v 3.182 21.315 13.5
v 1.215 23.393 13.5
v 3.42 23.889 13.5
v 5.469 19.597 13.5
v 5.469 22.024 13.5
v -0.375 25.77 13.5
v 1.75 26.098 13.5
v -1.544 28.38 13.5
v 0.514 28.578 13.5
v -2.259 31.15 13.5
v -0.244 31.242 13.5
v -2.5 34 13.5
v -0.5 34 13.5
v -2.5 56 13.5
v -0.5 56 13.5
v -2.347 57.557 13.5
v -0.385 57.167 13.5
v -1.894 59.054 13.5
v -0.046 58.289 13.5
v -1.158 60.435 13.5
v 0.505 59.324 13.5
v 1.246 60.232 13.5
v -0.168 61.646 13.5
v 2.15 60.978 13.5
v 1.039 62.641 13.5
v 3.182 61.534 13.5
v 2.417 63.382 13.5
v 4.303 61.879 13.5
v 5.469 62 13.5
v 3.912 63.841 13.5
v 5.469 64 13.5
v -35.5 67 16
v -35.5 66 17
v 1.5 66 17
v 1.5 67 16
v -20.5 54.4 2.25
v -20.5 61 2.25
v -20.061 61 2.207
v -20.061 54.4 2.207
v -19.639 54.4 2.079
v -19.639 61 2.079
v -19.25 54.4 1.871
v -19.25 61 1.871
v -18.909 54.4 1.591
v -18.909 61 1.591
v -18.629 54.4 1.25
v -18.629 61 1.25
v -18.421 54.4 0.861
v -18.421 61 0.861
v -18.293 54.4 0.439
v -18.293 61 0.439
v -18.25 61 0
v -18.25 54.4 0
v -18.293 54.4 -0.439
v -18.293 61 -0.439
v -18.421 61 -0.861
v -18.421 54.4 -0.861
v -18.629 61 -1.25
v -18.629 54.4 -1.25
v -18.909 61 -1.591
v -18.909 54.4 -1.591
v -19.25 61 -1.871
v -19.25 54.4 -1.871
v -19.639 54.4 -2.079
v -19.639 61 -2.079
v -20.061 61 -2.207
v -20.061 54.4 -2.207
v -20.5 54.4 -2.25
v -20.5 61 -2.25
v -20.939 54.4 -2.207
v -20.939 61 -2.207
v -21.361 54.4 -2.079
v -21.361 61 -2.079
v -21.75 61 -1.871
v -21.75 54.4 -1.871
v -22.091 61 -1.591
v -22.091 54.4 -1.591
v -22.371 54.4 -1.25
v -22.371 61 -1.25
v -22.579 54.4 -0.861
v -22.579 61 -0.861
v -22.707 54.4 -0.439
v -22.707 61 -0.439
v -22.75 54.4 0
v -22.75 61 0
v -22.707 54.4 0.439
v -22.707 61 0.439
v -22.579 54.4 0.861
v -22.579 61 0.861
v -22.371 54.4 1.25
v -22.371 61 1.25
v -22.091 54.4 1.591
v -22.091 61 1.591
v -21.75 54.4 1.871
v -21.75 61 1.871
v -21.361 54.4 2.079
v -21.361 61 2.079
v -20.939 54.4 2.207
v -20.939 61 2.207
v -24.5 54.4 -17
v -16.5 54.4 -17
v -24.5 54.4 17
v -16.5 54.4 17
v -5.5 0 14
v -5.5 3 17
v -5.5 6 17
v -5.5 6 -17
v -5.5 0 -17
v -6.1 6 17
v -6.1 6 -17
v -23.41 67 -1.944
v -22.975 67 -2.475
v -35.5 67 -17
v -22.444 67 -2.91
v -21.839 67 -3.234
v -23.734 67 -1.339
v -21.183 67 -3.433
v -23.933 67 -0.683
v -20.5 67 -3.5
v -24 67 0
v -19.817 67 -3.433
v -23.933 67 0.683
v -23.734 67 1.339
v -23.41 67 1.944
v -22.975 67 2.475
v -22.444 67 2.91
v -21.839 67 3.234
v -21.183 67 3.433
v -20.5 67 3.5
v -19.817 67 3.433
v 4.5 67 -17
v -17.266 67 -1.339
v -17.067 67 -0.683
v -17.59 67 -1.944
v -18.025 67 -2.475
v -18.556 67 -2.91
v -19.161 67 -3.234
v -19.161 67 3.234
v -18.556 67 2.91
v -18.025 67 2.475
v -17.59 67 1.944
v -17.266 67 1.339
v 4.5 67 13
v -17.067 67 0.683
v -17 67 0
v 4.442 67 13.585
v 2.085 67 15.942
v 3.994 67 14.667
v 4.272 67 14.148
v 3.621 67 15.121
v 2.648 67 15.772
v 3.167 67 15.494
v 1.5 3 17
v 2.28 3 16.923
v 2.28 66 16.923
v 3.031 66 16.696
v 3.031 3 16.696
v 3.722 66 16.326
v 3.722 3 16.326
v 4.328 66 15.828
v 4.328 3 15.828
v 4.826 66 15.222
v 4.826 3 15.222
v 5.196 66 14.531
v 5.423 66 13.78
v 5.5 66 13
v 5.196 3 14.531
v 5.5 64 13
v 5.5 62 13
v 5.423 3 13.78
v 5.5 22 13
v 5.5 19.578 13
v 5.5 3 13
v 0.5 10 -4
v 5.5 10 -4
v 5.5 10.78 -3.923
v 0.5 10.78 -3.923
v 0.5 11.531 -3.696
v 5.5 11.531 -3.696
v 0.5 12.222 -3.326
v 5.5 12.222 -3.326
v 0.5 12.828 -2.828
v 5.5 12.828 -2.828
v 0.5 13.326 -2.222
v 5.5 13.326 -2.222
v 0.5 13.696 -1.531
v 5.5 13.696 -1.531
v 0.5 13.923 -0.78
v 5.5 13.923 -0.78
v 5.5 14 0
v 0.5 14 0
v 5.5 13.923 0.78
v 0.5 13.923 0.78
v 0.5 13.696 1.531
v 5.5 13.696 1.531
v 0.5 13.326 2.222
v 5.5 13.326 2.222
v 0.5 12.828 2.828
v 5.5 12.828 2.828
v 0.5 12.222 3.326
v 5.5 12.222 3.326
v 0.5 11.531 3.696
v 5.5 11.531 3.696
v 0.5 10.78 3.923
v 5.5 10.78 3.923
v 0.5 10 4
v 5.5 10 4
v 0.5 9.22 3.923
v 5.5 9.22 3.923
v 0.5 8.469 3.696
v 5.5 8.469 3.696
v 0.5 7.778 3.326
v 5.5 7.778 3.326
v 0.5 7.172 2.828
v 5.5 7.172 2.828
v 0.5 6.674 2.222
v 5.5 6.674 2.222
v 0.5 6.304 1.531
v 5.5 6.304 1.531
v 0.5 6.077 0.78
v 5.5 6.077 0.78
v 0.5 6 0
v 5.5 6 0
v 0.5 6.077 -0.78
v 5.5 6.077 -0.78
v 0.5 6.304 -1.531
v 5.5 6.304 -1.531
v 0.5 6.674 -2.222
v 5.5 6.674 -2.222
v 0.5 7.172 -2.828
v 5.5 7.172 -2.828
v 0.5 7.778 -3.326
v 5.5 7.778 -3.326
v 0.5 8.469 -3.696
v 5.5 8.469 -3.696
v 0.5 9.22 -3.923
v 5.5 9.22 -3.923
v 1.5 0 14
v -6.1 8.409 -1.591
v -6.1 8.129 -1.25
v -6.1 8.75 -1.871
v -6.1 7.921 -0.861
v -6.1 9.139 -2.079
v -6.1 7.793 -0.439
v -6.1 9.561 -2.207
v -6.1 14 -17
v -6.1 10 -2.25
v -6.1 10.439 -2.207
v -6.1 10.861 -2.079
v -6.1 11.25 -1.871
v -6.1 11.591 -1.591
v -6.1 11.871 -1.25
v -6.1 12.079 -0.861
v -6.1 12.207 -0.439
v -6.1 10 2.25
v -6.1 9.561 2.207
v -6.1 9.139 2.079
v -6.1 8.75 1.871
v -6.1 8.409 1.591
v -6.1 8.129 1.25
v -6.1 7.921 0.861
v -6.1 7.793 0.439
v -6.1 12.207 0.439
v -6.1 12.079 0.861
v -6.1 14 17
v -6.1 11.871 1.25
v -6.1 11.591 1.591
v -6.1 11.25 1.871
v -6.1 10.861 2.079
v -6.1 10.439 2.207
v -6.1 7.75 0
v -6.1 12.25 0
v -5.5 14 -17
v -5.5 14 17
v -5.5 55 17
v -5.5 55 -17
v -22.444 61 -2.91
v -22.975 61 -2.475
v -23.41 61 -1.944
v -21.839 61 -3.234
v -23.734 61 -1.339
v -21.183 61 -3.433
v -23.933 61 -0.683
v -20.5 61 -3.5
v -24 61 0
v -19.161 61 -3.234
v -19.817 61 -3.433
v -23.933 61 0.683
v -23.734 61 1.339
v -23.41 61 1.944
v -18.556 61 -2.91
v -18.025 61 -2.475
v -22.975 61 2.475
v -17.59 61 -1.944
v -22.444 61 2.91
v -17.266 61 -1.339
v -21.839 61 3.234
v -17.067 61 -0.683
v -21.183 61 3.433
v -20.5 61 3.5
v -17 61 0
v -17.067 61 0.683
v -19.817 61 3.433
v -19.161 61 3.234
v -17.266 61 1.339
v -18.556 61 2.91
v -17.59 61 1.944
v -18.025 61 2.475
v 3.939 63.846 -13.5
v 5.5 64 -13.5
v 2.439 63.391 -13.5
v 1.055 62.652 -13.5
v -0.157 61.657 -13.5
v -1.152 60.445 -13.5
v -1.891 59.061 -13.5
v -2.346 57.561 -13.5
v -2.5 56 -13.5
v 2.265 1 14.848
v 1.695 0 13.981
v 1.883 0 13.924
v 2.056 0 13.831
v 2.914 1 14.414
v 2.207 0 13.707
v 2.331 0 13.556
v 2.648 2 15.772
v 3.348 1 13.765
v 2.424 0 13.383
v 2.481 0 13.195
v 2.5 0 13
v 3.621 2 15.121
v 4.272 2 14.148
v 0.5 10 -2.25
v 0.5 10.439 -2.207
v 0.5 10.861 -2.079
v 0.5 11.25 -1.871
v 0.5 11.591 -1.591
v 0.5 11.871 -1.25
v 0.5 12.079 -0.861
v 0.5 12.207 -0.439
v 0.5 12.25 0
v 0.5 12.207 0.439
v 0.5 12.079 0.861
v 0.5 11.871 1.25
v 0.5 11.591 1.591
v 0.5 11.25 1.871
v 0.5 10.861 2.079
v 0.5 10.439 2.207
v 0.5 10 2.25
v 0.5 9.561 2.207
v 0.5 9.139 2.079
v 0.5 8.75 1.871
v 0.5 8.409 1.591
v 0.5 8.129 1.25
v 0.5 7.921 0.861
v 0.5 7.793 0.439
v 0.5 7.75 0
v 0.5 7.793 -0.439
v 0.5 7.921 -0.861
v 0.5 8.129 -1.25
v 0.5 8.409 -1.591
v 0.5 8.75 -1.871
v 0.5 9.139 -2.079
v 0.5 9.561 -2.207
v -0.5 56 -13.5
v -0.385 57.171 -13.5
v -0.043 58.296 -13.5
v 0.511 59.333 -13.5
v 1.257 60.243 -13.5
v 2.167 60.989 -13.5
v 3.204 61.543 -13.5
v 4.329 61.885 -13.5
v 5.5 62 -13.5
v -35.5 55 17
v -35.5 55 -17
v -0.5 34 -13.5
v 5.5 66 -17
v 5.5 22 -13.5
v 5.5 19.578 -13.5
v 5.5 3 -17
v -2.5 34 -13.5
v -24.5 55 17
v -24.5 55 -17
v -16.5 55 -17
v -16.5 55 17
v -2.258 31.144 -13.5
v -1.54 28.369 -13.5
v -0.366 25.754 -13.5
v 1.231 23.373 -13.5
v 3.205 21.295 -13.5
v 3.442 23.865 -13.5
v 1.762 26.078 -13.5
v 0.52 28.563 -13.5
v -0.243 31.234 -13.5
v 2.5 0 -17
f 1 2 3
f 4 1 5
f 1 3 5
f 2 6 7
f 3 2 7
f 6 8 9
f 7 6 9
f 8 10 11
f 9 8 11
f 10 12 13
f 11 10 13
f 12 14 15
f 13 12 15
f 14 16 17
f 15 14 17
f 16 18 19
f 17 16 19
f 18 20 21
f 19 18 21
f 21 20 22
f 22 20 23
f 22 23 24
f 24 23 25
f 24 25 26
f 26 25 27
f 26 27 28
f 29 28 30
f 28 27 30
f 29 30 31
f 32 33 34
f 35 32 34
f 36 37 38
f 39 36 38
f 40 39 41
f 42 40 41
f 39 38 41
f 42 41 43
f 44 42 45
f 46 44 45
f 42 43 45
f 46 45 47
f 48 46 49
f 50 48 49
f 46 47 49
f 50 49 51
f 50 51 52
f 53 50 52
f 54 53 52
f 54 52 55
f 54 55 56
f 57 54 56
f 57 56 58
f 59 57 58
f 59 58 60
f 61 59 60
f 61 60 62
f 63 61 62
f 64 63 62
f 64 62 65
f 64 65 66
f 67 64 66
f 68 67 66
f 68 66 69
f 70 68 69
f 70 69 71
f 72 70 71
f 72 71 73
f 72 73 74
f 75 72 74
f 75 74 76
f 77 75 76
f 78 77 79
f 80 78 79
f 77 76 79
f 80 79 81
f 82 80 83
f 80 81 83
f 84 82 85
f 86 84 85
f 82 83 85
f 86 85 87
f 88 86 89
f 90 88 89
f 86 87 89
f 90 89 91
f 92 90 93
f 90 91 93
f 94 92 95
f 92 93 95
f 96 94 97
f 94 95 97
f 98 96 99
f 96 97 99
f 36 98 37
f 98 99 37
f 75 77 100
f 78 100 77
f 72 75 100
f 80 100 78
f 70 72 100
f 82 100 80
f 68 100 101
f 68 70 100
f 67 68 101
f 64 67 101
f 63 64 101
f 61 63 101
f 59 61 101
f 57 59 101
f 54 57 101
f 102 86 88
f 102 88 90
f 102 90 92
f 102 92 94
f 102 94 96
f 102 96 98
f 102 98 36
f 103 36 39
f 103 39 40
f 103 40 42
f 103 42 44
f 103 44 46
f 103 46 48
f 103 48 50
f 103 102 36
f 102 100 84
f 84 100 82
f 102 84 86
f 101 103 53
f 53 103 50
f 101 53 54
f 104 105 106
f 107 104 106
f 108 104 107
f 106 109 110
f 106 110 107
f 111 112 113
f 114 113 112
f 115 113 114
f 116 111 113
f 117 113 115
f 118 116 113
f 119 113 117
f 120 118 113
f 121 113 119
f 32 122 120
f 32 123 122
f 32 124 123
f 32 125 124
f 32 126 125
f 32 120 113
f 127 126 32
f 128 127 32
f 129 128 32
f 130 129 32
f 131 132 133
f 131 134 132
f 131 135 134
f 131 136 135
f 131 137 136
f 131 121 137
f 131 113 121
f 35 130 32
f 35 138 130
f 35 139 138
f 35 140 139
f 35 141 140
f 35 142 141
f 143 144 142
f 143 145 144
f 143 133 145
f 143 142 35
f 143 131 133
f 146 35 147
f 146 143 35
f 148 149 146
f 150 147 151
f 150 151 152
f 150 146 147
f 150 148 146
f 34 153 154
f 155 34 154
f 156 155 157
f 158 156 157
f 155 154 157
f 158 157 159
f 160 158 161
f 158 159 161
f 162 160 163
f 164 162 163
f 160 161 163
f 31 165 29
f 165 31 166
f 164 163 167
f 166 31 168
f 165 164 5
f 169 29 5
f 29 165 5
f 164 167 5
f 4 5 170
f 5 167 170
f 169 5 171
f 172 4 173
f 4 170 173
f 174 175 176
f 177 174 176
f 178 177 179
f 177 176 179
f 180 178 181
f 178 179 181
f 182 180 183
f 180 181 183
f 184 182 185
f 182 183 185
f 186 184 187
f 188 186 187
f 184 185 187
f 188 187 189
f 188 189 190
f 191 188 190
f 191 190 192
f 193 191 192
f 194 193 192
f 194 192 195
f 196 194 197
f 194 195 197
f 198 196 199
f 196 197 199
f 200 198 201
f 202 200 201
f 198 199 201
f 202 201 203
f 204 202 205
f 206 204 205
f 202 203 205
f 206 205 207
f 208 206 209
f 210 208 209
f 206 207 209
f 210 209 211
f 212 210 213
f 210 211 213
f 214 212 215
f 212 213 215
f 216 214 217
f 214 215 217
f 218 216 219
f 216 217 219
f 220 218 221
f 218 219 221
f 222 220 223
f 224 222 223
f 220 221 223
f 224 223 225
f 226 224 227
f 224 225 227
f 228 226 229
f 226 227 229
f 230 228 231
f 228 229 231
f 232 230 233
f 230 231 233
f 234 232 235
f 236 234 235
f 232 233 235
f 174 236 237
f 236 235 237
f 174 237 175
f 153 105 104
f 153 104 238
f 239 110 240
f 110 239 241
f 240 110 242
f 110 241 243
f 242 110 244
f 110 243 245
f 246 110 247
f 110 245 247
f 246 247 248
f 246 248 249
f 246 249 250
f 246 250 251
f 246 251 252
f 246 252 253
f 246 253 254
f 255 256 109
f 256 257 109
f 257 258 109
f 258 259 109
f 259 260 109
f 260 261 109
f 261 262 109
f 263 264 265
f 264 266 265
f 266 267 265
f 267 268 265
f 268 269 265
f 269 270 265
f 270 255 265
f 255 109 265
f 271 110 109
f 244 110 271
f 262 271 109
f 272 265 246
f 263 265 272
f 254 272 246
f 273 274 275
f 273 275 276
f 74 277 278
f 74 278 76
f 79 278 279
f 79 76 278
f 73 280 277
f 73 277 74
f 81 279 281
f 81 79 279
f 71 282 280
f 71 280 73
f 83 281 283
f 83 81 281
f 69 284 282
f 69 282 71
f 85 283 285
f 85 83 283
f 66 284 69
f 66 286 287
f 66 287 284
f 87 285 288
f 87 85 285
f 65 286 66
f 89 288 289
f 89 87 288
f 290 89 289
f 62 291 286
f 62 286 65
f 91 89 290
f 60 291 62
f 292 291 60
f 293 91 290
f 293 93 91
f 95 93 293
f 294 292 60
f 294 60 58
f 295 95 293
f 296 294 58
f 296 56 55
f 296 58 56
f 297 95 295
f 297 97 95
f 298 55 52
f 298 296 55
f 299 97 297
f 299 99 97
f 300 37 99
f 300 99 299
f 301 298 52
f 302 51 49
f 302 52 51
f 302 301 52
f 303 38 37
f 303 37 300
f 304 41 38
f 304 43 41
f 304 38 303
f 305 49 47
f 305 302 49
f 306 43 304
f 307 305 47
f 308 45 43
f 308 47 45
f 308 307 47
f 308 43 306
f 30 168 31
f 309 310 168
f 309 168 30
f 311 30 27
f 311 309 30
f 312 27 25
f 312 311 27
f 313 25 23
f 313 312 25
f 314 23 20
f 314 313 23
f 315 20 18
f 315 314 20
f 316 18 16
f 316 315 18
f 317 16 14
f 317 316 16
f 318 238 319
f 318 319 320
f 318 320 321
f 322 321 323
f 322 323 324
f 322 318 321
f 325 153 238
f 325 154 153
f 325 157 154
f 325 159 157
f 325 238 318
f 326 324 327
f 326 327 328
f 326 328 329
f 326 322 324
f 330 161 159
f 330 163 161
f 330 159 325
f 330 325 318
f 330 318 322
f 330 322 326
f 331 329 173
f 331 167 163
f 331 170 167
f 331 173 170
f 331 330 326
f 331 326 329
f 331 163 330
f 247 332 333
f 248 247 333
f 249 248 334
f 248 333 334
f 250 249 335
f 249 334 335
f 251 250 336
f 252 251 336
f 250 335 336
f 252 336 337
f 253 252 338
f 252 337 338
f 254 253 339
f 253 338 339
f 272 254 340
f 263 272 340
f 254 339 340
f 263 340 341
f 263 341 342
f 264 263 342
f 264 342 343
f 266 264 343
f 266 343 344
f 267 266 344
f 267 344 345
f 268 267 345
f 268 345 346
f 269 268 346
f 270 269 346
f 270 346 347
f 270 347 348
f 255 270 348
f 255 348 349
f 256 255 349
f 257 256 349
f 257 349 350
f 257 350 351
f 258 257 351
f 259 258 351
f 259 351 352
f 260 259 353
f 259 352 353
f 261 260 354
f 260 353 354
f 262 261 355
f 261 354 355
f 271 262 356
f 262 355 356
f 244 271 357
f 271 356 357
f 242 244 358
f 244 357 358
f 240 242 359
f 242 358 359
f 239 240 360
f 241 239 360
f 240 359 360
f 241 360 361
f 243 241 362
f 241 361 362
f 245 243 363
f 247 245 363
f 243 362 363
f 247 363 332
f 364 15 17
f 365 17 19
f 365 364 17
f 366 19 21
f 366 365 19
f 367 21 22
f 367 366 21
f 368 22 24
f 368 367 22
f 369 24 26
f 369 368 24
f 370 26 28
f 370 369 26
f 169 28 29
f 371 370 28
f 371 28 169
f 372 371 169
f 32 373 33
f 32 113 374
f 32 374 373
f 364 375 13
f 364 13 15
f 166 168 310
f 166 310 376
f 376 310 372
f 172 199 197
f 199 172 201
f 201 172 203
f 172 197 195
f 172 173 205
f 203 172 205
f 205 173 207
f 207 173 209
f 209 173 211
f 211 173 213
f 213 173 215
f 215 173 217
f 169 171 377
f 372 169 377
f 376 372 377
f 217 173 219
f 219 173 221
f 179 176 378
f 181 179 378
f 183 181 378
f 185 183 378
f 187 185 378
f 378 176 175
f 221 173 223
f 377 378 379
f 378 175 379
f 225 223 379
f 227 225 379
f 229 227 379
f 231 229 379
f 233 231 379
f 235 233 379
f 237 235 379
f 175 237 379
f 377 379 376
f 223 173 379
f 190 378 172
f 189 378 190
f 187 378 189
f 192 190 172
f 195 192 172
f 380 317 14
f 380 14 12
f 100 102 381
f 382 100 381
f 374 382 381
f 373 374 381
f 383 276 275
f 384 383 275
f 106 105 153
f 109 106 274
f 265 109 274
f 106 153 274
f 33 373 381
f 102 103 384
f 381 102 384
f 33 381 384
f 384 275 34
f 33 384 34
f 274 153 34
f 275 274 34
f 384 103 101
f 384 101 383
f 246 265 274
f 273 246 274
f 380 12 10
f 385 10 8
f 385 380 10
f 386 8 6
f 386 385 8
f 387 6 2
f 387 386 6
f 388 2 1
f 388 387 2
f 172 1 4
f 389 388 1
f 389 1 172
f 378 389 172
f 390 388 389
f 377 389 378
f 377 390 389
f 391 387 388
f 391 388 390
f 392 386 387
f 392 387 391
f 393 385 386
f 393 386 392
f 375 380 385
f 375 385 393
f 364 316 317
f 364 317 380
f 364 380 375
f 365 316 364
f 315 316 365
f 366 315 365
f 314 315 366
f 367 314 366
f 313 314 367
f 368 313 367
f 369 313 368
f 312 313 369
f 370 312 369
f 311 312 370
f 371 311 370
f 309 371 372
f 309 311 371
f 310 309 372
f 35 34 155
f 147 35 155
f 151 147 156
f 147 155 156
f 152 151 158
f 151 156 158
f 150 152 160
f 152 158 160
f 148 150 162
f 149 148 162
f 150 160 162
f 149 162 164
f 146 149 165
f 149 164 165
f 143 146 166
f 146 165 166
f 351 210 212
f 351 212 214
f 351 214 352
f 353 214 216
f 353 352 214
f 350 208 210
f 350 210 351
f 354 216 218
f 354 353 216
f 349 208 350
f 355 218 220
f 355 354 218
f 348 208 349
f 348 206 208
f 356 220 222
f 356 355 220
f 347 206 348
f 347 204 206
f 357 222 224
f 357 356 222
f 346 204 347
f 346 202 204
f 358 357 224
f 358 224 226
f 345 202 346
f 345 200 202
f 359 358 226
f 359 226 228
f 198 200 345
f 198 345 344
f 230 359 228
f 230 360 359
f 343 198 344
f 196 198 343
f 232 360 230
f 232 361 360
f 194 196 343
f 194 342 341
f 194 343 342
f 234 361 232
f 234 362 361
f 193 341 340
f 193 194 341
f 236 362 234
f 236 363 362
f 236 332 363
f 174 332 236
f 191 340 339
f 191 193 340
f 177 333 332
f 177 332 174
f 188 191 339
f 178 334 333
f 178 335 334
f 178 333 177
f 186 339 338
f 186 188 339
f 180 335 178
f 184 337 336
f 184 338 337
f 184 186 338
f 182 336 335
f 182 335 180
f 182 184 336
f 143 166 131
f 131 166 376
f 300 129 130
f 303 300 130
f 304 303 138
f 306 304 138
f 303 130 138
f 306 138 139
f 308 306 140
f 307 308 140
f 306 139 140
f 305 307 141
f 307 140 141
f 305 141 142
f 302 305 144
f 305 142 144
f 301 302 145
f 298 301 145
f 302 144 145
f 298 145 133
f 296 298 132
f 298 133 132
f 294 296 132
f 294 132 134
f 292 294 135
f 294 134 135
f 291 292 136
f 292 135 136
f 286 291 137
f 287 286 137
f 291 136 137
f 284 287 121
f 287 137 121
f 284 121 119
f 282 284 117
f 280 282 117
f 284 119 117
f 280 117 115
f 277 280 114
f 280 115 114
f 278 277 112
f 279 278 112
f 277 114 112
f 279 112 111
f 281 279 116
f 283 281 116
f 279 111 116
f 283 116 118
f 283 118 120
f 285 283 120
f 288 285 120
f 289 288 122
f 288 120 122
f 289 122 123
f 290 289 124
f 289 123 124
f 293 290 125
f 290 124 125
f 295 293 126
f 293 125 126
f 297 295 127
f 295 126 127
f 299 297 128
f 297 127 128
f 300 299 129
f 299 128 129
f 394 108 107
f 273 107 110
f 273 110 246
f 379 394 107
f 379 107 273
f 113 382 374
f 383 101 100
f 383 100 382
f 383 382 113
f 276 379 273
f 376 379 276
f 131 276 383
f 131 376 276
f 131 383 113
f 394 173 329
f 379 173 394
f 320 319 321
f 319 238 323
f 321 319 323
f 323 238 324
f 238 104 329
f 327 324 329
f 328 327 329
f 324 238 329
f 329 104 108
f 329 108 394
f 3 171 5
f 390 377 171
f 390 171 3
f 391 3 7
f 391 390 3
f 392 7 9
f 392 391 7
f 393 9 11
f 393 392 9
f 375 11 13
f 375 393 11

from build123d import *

# Parameters (mm, degrees)
SKETCH2_W           = 11
SKETCH2_H           = 34
BOSS_EXTRUDE1_DEPTH = 67
SKETCH3_W           = 34
SKETCH3_H           = 12
BOSS_EXTRUDE2_DEPTH = 30
SKETCH10_W          = 8
SKETCH10_H          = 0.6
SKETCH10_W_2        = 0.6
SKETCH10_H_2        = 8
BOSS_EXTRUDE3_DEPTH = 34
CUT_SWEEP1_START    = -13.5
CUT_SWEEP1_DEPTH    = 27
FILLET1_R           = 4
SKETCH7_R           = 2.25
CUT_EXTRUDE1_DEPTH  = 78.706177469
SKETCH8_R           = 2.25
CUT_EXTRUDE2_DEPTH  = 81.367904146
CHAMFER1_SIZE       = 3
CHAMFER2_SIZE       = 1
SKETCH9_R           = 3.5
CUT_EXTRUDE3_DEPTH  = 6
SKETCH11_R          = 4
CUT_EXTRUDE4_DEPTH  = 5


# Read off the part's stored shape, not the designer's step: Cut-Sweep1
with BuildPart() as part:
    # Sketch2 → Boss-Extrude1 (new body)
    with BuildSketch(Plane(origin=(0, 0, 0), x_dir=(1, 0, 0), z_dir=(0, 1, 0))):
        Rectangle(SKETCH2_W, SKETCH2_H)
    extrude(amount=BOSS_EXTRUDE1_DEPTH)

    # Sketch3 → Boss-Extrude2 (add)
    with BuildSketch(Plane.ZY.offset(5.5)):
        with Locations((0, 61)):
            Rectangle(SKETCH3_W, SKETCH3_H)
    extrude(amount=BOSS_EXTRUDE2_DEPTH)

    # Sketch10 → Boss-Extrude3 (add)
    with BuildSketch(Plane.XY.offset(17)):
        with Locations((-20.5, 54.7)):
            Rectangle(SKETCH10_W, SKETCH10_H)
        with Locations((-5.8, 10)):
            Rectangle(SKETCH10_W_2, SKETCH10_H_2)
    extrude(amount=-BOSS_EXTRUDE3_DEPTH)

    # Cut-Sweep1 outline → Cut-Sweep1 (cut)
    with BuildSketch(Plane.XY.offset(CUT_SWEEP1_START)):
        with BuildLine():
            ThreePointArc((5.5, 22), (1.083592135, 27.291796068), (-0.5, 34))
            Line((-0.5, 34), (-0.5, 56))
            ThreePointArc((-0.5, 56), (1.257359313, 60.242640687), (5.5, 62))
            Line((5.5, 62), (5.5, 64))
            ThreePointArc((5.5, 64), (-0.156854249, 61.656854249), (-2.5, 56))
            Line((-2.5, 56), (-2.5, 34))
            ThreePointArc((-2.5, 34), (-0.366068747, 25.753788749), (5.5, 19.577794898))
            Line((5.5, 19.577794898), (5.5, 22))
        make_face()
    extrude(amount=CUT_SWEEP1_DEPTH, mode=Mode.SUBTRACT)

    # Fillet1
    # the kernel refuses this fillet: 4 mm, written as the material it takes off along each edge
    with BuildSketch(Plane(origin=(5.5, -10, 17), x_dir=(0, 0, -1), z_dir=(0, 1, 0))) as fillet1_piece_1:
        with BuildLine():
            CenterArc((FILLET1_R, FILLET1_R), FILLET1_R, 180, 90)
            Line((0, FILLET1_R), (0, 0))
            Line((0, 0), (FILLET1_R, 0))
        make_face()
    extrude(amount=87, mode=Mode.SUBTRACT)

    # Sketch7 → Cut-Extrude1 (cut, through all)
    with BuildSketch(Plane(origin=(0, 67, 0), x_dir=(1, 0, 0), z_dir=(0, 1, 0))):
        with Locations(Location((-20.5, 0, 0), (0, 0, 270))):
            Circle(SKETCH7_R)
    extrude(amount=-CUT_EXTRUDE1_DEPTH, mode=Mode.SUBTRACT)

    # Sketch8 → Cut-Extrude2 (cut, through all)
    with BuildSketch(Plane(origin=(5.5, 0, 0), x_dir=(0, 0, -1), z_dir=(1, 0, 0))):
        with Locations((0, 10)):
            Circle(SKETCH8_R)
    extrude(amount=-CUT_EXTRUDE2_DEPTH, mode=Mode.SUBTRACT)

    # Chamfer1
    chamfer1_edges = [part.edges().sort_by_distance(p)[0] for p in [
        (-2, 0, 17),
        (5.5, 0, -2),
        (4.328427125, 0, 15.828427125),
    ]]
    chamfer(chamfer1_edges, length=CHAMFER1_SIZE)

    # Chamfer2
    chamfer2_edges = [part.edges().sort_by_distance(p)[0] for p in [
        (-17, 67, 17),
        (5.5, 67, -2),
        (4.328427125, 67, 15.828427125),
    ]]
    chamfer(chamfer2_edges, length=CHAMFER2_SIZE)

    # Sketch9 → Cut-Extrude3 (cut)
    with BuildSketch(Plane(origin=(0, 67, 0), x_dir=(1, 0, 0), z_dir=(0, 1, 0))):
        with Locations(Location((-20.5, 0, 0), (0, 0, 270))):
            Circle(SKETCH9_R)
    extrude(amount=-CUT_EXTRUDE3_DEPTH, mode=Mode.SUBTRACT)

    # Sketch11 → Cut-Extrude4 (cut)
    with BuildSketch(Plane(origin=(5.5, 0, 0), x_dir=(0, 0, -1), z_dir=(1, 0, 0))):
        with Locations((0, 10)):
            Circle(SKETCH11_R)
    extrude(amount=-CUT_EXTRUDE4_DEPTH, mode=Mode.SUBTRACT)


solid = part.part
